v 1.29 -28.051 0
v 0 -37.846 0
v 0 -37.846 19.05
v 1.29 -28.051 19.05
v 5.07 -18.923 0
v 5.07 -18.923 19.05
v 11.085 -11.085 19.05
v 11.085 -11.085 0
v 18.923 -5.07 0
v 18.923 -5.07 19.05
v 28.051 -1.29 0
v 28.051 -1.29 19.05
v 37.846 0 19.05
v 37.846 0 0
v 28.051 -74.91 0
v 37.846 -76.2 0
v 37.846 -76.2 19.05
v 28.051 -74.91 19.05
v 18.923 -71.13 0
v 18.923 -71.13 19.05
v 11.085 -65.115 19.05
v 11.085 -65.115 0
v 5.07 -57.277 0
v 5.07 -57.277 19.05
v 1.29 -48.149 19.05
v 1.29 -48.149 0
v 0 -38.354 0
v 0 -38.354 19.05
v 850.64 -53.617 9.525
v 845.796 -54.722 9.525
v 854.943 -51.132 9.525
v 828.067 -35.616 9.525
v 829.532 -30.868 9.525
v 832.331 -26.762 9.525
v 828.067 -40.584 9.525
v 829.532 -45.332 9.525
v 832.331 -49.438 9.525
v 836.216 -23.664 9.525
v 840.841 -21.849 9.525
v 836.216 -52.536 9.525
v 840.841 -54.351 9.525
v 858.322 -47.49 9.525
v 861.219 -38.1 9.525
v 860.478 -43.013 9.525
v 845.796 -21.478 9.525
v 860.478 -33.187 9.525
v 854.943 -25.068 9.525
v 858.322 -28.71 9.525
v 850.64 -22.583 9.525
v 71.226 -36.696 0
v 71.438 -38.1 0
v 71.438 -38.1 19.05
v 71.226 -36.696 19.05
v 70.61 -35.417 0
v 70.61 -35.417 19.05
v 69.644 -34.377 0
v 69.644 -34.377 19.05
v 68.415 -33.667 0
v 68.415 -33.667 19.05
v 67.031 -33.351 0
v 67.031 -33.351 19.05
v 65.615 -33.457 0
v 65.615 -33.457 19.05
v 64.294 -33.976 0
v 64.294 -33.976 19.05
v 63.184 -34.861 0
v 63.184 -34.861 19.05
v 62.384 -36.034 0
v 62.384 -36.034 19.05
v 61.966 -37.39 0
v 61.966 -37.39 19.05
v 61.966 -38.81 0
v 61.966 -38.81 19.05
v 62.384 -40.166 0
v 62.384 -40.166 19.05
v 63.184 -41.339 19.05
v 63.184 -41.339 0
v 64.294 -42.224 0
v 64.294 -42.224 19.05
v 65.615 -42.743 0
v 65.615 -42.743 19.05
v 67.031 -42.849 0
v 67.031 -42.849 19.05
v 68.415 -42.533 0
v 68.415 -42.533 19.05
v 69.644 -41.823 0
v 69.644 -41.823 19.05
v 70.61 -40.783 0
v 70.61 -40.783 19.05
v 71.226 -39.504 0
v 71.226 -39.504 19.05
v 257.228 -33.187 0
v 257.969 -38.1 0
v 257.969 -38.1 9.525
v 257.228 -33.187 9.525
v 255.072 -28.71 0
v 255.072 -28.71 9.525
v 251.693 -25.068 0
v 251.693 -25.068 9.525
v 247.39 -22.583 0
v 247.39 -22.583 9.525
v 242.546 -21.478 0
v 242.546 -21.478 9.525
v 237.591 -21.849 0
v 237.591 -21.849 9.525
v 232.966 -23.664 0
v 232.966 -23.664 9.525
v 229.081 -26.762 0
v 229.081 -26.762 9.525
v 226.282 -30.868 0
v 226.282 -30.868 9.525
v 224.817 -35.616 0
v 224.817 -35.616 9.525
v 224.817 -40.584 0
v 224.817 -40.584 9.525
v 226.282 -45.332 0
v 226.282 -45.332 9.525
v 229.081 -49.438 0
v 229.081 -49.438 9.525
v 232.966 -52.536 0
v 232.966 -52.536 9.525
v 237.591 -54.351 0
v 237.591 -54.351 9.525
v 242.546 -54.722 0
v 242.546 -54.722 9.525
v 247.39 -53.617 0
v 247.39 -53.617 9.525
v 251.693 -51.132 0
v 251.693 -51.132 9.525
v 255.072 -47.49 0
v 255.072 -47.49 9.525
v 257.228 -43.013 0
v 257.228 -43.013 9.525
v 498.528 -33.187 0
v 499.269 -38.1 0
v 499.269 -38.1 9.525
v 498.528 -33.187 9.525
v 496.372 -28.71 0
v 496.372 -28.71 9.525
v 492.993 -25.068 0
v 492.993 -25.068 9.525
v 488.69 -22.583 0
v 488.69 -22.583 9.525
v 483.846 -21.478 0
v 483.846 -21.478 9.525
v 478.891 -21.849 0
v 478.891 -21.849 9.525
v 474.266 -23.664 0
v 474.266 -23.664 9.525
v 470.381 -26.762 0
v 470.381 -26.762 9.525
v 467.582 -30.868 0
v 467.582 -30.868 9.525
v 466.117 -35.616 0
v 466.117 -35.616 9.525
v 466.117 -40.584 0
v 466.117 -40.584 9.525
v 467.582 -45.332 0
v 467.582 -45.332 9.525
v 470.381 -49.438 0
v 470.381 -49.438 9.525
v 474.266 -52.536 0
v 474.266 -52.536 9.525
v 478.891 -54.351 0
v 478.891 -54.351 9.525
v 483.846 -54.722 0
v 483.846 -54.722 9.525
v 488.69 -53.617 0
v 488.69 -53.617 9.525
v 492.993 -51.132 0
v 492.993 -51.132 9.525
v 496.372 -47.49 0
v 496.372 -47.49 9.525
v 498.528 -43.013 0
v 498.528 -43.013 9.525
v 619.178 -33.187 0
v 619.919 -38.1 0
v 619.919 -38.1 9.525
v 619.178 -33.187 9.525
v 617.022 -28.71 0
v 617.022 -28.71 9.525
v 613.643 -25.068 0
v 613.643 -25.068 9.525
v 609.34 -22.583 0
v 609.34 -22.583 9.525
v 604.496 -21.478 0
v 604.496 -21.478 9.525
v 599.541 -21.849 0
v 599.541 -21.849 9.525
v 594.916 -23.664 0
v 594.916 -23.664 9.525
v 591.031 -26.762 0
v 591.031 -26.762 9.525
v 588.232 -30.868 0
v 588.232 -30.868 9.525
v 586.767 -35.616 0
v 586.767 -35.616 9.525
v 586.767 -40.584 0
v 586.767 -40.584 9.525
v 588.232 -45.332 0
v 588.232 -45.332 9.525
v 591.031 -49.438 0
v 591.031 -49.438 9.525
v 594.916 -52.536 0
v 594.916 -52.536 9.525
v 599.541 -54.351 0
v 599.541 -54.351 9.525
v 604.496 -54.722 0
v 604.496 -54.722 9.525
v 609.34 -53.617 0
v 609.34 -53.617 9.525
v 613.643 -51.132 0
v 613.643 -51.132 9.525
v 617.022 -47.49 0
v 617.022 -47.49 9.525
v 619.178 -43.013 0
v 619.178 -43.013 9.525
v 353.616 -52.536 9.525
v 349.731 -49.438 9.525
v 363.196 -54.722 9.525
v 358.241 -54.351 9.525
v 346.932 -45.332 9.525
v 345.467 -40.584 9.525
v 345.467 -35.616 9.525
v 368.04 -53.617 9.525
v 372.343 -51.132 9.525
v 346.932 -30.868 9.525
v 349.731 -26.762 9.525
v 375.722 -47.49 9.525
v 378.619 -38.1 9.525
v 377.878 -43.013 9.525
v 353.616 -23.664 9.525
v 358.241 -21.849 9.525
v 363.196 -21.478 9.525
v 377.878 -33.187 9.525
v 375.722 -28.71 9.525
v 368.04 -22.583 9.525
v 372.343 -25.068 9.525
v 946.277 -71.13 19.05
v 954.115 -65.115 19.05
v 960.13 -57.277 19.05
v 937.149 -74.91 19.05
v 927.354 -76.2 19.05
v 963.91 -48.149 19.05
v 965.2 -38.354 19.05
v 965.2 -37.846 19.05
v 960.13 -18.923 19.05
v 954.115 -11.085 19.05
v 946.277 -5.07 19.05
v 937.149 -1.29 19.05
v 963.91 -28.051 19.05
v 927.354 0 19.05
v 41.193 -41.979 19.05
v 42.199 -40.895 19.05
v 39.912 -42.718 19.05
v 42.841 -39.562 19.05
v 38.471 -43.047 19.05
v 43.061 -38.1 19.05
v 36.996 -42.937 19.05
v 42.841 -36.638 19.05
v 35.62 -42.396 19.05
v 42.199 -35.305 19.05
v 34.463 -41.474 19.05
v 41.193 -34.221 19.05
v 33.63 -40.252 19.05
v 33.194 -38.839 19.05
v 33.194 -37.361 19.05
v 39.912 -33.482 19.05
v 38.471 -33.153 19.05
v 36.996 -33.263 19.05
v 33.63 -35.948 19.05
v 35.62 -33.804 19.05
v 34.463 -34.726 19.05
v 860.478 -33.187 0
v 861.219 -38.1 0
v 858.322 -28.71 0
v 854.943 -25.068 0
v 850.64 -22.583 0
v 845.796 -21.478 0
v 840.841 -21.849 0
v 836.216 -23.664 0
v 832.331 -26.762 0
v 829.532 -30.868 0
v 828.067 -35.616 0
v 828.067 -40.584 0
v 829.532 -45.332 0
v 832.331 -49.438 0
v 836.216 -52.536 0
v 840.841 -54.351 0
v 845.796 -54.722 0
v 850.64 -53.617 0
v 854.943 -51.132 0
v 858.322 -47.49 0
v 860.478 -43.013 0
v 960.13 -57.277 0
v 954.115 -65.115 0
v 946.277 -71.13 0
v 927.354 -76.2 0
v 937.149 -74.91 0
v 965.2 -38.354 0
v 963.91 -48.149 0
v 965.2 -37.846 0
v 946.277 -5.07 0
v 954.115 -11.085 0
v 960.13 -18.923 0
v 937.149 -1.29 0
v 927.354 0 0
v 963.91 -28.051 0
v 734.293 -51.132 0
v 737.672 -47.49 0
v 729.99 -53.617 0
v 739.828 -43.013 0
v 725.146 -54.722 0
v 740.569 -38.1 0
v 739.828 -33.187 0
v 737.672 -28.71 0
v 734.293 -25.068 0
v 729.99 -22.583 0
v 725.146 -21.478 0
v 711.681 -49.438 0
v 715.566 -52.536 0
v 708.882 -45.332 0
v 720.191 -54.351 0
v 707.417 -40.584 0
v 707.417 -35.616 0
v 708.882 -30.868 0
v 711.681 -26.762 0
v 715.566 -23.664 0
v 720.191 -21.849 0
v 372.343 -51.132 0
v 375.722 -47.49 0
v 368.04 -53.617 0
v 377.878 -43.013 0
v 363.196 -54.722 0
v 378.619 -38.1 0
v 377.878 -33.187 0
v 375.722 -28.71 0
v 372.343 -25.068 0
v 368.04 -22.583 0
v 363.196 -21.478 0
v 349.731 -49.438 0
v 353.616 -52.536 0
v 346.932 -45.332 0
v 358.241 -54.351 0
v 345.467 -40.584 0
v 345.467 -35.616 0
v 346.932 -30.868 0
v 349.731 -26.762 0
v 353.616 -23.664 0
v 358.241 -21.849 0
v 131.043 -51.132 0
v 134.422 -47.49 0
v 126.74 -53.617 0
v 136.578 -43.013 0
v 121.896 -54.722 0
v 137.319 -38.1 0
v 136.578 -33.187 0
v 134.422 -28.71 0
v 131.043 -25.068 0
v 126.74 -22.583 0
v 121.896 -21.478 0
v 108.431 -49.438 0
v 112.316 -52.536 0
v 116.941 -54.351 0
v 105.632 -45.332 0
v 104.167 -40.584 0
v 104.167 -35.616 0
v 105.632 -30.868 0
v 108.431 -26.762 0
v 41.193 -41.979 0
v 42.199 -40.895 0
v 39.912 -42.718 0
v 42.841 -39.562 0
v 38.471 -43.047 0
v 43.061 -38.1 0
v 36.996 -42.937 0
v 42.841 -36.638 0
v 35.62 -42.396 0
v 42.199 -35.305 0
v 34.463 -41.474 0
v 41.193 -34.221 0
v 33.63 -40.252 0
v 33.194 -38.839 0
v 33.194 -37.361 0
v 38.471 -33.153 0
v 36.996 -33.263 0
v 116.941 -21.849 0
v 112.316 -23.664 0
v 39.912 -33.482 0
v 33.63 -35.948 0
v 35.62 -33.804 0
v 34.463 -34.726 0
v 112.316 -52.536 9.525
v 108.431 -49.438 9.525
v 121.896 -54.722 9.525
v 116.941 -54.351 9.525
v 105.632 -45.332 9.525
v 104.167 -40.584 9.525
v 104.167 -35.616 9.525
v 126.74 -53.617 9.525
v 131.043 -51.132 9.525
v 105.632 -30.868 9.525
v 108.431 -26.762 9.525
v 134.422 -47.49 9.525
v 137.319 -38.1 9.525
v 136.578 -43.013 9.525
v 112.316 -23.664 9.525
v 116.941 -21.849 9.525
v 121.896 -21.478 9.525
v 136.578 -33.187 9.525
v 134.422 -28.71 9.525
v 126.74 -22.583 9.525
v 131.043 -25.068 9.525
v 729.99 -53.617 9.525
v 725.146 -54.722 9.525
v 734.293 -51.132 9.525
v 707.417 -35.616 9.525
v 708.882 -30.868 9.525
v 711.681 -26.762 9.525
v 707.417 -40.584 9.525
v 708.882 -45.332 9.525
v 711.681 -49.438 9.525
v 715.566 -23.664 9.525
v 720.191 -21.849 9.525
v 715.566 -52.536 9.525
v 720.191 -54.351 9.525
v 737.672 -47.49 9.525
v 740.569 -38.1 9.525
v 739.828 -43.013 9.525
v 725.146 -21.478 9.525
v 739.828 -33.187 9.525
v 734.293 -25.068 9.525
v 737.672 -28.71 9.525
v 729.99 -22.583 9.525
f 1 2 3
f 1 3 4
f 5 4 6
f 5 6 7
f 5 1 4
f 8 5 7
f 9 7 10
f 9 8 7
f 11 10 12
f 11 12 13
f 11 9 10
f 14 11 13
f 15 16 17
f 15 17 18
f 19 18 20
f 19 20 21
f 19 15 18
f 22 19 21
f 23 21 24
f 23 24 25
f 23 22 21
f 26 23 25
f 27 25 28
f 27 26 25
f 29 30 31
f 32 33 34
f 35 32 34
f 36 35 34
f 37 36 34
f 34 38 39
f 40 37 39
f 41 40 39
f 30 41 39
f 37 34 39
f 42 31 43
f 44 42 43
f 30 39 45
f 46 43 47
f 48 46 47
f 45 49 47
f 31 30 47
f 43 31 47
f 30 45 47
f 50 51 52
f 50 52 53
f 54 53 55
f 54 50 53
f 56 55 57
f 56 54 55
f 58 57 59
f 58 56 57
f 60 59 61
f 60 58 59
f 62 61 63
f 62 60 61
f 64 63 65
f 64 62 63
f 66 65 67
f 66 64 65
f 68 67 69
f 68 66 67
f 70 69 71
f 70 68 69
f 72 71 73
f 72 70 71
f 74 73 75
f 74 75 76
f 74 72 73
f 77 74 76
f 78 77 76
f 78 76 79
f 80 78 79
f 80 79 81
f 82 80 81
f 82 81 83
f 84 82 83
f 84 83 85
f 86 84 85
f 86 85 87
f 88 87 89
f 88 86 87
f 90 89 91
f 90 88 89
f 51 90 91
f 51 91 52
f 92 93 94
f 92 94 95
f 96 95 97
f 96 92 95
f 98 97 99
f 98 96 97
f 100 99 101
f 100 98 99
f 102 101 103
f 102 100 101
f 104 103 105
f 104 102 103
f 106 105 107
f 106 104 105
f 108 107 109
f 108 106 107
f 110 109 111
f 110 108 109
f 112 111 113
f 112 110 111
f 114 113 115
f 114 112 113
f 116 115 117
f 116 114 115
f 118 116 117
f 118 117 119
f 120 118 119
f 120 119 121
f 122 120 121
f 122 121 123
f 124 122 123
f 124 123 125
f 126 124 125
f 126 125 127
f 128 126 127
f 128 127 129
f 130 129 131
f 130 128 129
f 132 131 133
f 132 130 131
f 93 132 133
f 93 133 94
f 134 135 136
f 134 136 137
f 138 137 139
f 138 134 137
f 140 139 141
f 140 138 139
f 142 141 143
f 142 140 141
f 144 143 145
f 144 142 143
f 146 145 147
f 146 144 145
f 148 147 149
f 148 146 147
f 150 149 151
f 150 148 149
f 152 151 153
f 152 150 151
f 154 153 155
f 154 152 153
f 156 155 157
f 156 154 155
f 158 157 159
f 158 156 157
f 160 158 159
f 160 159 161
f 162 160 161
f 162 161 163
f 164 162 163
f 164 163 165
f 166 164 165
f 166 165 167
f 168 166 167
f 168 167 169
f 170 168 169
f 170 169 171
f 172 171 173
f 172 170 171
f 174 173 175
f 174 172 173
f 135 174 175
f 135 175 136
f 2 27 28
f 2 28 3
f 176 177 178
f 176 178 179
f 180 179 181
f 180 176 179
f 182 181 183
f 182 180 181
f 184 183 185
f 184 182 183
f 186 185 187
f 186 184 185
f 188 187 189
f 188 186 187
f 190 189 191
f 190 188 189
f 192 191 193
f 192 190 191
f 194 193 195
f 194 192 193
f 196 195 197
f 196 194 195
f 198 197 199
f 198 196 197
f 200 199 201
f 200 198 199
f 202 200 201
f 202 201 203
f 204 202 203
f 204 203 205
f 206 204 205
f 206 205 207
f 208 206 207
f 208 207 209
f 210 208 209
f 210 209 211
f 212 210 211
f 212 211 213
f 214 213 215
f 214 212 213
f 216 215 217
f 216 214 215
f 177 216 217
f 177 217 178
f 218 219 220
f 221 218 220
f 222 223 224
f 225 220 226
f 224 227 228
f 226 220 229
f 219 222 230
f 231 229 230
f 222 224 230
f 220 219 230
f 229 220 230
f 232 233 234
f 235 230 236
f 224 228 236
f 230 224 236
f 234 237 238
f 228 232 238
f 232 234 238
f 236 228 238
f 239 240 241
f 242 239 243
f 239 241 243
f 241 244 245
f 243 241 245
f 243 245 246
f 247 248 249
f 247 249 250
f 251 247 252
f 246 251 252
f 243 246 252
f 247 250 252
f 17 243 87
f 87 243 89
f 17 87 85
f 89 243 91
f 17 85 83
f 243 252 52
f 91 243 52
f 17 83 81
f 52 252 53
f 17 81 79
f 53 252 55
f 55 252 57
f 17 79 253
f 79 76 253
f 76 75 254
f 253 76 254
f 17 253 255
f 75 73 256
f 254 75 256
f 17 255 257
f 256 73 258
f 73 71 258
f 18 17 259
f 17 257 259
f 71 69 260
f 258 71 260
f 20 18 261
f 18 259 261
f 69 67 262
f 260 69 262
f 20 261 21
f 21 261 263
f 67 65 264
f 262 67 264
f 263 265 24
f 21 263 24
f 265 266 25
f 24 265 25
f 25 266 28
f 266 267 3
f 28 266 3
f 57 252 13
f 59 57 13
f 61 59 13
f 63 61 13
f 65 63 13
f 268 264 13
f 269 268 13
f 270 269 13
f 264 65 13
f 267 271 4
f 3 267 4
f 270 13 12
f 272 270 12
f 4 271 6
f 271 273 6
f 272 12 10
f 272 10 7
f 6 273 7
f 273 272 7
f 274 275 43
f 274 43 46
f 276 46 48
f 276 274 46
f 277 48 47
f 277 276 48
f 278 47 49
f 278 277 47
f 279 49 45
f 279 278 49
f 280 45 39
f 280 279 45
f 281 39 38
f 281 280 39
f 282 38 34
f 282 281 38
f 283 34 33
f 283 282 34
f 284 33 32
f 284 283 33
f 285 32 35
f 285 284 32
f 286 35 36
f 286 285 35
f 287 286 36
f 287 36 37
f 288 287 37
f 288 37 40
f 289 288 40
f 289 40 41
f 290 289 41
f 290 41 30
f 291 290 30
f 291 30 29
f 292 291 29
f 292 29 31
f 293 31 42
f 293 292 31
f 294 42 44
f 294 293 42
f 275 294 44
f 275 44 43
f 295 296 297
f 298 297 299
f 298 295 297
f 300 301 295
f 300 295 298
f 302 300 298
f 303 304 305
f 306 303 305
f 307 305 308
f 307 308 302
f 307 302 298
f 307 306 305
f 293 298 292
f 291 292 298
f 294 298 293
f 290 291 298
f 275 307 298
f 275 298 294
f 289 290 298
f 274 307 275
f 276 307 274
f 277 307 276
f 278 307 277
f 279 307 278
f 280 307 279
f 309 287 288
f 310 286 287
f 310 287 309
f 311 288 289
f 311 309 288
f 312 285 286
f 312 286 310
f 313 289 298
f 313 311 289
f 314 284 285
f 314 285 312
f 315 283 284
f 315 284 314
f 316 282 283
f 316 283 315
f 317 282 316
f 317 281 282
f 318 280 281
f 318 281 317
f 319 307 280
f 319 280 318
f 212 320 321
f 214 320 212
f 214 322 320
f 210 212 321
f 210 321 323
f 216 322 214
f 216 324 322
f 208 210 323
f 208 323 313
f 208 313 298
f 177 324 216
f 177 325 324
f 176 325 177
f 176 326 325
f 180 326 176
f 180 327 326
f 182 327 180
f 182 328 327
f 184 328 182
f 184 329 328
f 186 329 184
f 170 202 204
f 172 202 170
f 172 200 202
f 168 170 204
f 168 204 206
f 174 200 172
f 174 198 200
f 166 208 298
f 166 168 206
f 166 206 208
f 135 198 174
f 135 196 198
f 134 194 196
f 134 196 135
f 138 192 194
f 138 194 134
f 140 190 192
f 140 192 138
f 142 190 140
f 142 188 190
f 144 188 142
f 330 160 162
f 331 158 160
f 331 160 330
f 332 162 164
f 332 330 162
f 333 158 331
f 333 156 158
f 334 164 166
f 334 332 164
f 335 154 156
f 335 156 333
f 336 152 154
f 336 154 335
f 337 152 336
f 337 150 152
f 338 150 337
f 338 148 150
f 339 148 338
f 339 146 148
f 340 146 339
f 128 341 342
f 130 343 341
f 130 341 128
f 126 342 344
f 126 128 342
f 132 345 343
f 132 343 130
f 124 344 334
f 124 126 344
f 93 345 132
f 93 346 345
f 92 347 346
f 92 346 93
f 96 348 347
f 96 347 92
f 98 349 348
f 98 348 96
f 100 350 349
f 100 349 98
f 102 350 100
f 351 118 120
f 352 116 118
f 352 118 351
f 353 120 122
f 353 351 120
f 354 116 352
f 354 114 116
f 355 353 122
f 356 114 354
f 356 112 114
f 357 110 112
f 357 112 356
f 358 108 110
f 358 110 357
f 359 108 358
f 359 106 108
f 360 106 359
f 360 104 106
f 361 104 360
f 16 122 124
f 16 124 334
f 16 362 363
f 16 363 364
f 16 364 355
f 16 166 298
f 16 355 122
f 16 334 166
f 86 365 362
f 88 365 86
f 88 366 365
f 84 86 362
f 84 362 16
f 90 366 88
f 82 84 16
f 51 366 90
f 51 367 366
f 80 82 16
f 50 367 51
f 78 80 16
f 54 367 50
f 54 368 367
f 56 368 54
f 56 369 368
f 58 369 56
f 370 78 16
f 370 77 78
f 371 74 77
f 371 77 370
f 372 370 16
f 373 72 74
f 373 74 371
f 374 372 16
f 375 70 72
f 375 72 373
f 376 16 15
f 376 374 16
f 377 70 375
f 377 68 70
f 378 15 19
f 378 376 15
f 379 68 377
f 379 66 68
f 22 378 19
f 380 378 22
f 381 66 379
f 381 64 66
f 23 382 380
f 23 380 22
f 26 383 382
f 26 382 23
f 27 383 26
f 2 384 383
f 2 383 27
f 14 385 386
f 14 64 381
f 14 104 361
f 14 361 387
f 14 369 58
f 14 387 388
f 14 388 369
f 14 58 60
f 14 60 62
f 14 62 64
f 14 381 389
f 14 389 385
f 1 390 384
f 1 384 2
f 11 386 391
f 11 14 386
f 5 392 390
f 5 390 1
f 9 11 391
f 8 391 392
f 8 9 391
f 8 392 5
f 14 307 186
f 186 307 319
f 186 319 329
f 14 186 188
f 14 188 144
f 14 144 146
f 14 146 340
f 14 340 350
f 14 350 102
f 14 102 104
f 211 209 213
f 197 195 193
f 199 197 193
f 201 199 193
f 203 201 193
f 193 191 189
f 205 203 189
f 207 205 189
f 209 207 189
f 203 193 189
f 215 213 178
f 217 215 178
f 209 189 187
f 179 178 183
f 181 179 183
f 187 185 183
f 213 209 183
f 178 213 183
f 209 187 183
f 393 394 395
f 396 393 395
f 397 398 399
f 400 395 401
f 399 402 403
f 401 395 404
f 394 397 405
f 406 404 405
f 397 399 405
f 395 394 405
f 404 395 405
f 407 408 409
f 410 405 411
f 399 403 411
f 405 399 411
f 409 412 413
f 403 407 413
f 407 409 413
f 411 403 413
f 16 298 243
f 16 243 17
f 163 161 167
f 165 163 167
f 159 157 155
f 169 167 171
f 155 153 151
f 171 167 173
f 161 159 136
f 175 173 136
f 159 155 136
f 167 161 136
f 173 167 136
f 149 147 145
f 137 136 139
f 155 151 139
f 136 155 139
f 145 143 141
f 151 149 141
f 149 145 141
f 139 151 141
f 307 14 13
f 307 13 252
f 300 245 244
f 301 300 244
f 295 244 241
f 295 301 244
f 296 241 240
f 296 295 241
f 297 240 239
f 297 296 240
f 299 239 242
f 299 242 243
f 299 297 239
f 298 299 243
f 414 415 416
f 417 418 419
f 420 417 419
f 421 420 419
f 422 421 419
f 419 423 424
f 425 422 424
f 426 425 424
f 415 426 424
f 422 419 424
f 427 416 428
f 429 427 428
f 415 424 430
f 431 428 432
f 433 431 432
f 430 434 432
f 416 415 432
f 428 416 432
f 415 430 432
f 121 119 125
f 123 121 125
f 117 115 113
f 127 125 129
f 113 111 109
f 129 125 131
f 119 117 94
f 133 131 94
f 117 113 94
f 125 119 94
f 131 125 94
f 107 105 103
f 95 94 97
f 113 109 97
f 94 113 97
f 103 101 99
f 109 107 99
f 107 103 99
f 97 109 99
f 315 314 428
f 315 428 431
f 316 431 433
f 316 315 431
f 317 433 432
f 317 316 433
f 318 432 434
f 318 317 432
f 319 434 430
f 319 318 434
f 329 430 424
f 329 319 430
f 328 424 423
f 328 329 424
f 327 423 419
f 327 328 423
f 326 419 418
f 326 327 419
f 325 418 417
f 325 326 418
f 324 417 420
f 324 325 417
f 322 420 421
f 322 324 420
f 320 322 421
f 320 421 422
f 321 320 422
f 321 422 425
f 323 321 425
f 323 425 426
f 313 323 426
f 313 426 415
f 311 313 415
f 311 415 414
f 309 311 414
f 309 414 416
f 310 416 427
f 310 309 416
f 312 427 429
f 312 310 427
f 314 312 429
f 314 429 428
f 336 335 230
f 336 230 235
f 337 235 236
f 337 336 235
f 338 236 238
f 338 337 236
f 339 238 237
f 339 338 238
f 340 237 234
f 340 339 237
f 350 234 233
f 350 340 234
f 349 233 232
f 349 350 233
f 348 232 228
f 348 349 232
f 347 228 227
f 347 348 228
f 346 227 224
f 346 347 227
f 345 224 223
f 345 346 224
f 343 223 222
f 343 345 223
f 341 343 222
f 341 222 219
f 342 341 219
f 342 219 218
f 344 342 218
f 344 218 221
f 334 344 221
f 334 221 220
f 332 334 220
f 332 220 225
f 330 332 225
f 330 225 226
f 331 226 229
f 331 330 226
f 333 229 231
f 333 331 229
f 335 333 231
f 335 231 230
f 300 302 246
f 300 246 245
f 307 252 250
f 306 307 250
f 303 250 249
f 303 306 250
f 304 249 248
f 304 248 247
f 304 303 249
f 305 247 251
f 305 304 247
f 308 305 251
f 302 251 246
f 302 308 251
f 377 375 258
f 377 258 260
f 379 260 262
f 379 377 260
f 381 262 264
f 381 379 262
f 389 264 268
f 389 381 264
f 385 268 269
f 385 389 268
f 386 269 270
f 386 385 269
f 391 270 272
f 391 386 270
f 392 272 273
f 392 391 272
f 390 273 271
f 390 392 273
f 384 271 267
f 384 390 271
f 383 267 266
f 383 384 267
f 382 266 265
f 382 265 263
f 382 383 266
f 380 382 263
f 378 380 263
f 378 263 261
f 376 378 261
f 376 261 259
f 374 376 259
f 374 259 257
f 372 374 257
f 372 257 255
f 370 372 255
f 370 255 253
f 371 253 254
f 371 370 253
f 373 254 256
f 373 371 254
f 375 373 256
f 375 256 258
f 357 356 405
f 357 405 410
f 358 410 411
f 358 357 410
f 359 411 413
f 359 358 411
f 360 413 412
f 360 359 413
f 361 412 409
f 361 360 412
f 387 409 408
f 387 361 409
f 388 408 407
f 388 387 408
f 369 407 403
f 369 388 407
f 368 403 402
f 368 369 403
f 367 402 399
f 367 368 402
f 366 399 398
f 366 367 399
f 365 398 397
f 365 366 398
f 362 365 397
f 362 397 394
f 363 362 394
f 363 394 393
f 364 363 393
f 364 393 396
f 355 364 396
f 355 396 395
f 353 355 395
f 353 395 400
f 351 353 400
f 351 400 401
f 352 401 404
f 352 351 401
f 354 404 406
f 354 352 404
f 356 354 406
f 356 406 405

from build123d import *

# Parameters (mm, degrees)
BOSS_EXTRUDE1_DEPTH = 19.05
SKETCH3_R           = 16.66875
CUT_EXTRUDE1_DEPTH  = 9.525
SKETCH5_R           = 4.9609375
SKETCH5_R_2         = 4.7625
CUT_EXTRUDE10_DEPTH = 19.05


with BuildPart() as part:
    # Sketch2 → Boss-Extrude1 (new body)
    with BuildSketch(Plane.XY):
        with BuildLine():
            Line((37.846, 0), (927.354, 0))
            ThreePointArc((927.354, 0), (954.115163241, -11.084836759), (965.2, -37.846))
            Line((965.2, -37.846), (965.2, -38.354))
            ThreePointArc((965.2, -38.354), (954.115163241, -65.115163241), (927.354, -76.2))
            Line((927.354, -76.2), (37.846, -76.2))
            ThreePointArc((37.846, -76.2), (11.084836759, -65.115163241), (0, -38.354))
            Line((0, -38.354), (0, -37.846))
            ThreePointArc((0, -37.846), (11.084836759, -11.084836759), (37.846, 0))
        make_face()
    extrude(amount=BOSS_EXTRUDE1_DEPTH)

    # Sketch3 → Cut-Extrude1 (cut)
    with BuildSketch(Plane.XY):
        with Locations((120.65, -38.1)):
            Circle(SKETCH3_R)
        with Locations((241.3, -38.1)):
            Circle(SKETCH3_R)
        with Locations((361.95, -38.1)):
            Circle(SKETCH3_R)
        with Locations((844.55, -38.1)):
            Circle(SKETCH3_R)
        with Locations((723.9, -38.1)):
            Circle(SKETCH3_R)
        with Locations((603.25, -38.1)):
            Circle(SKETCH3_R)
        with Locations((482.6, -38.1)):
            Circle(SKETCH3_R)
    extrude(amount=CUT_EXTRUDE1_DEPTH, mode=Mode.SUBTRACT)

    # Sketch5 → Cut-Extrude10 (cut)
    with BuildSketch(Plane.XY):
        with Locations((38.1, -38.1)):
            Circle(SKETCH5_R)
        with Locations((66.675, -38.1)):
            Circle(SKETCH5_R_2)
    extrude(amount=CUT_EXTRUDE10_DEPTH, mode=Mode.SUBTRACT)


solid = part.part
